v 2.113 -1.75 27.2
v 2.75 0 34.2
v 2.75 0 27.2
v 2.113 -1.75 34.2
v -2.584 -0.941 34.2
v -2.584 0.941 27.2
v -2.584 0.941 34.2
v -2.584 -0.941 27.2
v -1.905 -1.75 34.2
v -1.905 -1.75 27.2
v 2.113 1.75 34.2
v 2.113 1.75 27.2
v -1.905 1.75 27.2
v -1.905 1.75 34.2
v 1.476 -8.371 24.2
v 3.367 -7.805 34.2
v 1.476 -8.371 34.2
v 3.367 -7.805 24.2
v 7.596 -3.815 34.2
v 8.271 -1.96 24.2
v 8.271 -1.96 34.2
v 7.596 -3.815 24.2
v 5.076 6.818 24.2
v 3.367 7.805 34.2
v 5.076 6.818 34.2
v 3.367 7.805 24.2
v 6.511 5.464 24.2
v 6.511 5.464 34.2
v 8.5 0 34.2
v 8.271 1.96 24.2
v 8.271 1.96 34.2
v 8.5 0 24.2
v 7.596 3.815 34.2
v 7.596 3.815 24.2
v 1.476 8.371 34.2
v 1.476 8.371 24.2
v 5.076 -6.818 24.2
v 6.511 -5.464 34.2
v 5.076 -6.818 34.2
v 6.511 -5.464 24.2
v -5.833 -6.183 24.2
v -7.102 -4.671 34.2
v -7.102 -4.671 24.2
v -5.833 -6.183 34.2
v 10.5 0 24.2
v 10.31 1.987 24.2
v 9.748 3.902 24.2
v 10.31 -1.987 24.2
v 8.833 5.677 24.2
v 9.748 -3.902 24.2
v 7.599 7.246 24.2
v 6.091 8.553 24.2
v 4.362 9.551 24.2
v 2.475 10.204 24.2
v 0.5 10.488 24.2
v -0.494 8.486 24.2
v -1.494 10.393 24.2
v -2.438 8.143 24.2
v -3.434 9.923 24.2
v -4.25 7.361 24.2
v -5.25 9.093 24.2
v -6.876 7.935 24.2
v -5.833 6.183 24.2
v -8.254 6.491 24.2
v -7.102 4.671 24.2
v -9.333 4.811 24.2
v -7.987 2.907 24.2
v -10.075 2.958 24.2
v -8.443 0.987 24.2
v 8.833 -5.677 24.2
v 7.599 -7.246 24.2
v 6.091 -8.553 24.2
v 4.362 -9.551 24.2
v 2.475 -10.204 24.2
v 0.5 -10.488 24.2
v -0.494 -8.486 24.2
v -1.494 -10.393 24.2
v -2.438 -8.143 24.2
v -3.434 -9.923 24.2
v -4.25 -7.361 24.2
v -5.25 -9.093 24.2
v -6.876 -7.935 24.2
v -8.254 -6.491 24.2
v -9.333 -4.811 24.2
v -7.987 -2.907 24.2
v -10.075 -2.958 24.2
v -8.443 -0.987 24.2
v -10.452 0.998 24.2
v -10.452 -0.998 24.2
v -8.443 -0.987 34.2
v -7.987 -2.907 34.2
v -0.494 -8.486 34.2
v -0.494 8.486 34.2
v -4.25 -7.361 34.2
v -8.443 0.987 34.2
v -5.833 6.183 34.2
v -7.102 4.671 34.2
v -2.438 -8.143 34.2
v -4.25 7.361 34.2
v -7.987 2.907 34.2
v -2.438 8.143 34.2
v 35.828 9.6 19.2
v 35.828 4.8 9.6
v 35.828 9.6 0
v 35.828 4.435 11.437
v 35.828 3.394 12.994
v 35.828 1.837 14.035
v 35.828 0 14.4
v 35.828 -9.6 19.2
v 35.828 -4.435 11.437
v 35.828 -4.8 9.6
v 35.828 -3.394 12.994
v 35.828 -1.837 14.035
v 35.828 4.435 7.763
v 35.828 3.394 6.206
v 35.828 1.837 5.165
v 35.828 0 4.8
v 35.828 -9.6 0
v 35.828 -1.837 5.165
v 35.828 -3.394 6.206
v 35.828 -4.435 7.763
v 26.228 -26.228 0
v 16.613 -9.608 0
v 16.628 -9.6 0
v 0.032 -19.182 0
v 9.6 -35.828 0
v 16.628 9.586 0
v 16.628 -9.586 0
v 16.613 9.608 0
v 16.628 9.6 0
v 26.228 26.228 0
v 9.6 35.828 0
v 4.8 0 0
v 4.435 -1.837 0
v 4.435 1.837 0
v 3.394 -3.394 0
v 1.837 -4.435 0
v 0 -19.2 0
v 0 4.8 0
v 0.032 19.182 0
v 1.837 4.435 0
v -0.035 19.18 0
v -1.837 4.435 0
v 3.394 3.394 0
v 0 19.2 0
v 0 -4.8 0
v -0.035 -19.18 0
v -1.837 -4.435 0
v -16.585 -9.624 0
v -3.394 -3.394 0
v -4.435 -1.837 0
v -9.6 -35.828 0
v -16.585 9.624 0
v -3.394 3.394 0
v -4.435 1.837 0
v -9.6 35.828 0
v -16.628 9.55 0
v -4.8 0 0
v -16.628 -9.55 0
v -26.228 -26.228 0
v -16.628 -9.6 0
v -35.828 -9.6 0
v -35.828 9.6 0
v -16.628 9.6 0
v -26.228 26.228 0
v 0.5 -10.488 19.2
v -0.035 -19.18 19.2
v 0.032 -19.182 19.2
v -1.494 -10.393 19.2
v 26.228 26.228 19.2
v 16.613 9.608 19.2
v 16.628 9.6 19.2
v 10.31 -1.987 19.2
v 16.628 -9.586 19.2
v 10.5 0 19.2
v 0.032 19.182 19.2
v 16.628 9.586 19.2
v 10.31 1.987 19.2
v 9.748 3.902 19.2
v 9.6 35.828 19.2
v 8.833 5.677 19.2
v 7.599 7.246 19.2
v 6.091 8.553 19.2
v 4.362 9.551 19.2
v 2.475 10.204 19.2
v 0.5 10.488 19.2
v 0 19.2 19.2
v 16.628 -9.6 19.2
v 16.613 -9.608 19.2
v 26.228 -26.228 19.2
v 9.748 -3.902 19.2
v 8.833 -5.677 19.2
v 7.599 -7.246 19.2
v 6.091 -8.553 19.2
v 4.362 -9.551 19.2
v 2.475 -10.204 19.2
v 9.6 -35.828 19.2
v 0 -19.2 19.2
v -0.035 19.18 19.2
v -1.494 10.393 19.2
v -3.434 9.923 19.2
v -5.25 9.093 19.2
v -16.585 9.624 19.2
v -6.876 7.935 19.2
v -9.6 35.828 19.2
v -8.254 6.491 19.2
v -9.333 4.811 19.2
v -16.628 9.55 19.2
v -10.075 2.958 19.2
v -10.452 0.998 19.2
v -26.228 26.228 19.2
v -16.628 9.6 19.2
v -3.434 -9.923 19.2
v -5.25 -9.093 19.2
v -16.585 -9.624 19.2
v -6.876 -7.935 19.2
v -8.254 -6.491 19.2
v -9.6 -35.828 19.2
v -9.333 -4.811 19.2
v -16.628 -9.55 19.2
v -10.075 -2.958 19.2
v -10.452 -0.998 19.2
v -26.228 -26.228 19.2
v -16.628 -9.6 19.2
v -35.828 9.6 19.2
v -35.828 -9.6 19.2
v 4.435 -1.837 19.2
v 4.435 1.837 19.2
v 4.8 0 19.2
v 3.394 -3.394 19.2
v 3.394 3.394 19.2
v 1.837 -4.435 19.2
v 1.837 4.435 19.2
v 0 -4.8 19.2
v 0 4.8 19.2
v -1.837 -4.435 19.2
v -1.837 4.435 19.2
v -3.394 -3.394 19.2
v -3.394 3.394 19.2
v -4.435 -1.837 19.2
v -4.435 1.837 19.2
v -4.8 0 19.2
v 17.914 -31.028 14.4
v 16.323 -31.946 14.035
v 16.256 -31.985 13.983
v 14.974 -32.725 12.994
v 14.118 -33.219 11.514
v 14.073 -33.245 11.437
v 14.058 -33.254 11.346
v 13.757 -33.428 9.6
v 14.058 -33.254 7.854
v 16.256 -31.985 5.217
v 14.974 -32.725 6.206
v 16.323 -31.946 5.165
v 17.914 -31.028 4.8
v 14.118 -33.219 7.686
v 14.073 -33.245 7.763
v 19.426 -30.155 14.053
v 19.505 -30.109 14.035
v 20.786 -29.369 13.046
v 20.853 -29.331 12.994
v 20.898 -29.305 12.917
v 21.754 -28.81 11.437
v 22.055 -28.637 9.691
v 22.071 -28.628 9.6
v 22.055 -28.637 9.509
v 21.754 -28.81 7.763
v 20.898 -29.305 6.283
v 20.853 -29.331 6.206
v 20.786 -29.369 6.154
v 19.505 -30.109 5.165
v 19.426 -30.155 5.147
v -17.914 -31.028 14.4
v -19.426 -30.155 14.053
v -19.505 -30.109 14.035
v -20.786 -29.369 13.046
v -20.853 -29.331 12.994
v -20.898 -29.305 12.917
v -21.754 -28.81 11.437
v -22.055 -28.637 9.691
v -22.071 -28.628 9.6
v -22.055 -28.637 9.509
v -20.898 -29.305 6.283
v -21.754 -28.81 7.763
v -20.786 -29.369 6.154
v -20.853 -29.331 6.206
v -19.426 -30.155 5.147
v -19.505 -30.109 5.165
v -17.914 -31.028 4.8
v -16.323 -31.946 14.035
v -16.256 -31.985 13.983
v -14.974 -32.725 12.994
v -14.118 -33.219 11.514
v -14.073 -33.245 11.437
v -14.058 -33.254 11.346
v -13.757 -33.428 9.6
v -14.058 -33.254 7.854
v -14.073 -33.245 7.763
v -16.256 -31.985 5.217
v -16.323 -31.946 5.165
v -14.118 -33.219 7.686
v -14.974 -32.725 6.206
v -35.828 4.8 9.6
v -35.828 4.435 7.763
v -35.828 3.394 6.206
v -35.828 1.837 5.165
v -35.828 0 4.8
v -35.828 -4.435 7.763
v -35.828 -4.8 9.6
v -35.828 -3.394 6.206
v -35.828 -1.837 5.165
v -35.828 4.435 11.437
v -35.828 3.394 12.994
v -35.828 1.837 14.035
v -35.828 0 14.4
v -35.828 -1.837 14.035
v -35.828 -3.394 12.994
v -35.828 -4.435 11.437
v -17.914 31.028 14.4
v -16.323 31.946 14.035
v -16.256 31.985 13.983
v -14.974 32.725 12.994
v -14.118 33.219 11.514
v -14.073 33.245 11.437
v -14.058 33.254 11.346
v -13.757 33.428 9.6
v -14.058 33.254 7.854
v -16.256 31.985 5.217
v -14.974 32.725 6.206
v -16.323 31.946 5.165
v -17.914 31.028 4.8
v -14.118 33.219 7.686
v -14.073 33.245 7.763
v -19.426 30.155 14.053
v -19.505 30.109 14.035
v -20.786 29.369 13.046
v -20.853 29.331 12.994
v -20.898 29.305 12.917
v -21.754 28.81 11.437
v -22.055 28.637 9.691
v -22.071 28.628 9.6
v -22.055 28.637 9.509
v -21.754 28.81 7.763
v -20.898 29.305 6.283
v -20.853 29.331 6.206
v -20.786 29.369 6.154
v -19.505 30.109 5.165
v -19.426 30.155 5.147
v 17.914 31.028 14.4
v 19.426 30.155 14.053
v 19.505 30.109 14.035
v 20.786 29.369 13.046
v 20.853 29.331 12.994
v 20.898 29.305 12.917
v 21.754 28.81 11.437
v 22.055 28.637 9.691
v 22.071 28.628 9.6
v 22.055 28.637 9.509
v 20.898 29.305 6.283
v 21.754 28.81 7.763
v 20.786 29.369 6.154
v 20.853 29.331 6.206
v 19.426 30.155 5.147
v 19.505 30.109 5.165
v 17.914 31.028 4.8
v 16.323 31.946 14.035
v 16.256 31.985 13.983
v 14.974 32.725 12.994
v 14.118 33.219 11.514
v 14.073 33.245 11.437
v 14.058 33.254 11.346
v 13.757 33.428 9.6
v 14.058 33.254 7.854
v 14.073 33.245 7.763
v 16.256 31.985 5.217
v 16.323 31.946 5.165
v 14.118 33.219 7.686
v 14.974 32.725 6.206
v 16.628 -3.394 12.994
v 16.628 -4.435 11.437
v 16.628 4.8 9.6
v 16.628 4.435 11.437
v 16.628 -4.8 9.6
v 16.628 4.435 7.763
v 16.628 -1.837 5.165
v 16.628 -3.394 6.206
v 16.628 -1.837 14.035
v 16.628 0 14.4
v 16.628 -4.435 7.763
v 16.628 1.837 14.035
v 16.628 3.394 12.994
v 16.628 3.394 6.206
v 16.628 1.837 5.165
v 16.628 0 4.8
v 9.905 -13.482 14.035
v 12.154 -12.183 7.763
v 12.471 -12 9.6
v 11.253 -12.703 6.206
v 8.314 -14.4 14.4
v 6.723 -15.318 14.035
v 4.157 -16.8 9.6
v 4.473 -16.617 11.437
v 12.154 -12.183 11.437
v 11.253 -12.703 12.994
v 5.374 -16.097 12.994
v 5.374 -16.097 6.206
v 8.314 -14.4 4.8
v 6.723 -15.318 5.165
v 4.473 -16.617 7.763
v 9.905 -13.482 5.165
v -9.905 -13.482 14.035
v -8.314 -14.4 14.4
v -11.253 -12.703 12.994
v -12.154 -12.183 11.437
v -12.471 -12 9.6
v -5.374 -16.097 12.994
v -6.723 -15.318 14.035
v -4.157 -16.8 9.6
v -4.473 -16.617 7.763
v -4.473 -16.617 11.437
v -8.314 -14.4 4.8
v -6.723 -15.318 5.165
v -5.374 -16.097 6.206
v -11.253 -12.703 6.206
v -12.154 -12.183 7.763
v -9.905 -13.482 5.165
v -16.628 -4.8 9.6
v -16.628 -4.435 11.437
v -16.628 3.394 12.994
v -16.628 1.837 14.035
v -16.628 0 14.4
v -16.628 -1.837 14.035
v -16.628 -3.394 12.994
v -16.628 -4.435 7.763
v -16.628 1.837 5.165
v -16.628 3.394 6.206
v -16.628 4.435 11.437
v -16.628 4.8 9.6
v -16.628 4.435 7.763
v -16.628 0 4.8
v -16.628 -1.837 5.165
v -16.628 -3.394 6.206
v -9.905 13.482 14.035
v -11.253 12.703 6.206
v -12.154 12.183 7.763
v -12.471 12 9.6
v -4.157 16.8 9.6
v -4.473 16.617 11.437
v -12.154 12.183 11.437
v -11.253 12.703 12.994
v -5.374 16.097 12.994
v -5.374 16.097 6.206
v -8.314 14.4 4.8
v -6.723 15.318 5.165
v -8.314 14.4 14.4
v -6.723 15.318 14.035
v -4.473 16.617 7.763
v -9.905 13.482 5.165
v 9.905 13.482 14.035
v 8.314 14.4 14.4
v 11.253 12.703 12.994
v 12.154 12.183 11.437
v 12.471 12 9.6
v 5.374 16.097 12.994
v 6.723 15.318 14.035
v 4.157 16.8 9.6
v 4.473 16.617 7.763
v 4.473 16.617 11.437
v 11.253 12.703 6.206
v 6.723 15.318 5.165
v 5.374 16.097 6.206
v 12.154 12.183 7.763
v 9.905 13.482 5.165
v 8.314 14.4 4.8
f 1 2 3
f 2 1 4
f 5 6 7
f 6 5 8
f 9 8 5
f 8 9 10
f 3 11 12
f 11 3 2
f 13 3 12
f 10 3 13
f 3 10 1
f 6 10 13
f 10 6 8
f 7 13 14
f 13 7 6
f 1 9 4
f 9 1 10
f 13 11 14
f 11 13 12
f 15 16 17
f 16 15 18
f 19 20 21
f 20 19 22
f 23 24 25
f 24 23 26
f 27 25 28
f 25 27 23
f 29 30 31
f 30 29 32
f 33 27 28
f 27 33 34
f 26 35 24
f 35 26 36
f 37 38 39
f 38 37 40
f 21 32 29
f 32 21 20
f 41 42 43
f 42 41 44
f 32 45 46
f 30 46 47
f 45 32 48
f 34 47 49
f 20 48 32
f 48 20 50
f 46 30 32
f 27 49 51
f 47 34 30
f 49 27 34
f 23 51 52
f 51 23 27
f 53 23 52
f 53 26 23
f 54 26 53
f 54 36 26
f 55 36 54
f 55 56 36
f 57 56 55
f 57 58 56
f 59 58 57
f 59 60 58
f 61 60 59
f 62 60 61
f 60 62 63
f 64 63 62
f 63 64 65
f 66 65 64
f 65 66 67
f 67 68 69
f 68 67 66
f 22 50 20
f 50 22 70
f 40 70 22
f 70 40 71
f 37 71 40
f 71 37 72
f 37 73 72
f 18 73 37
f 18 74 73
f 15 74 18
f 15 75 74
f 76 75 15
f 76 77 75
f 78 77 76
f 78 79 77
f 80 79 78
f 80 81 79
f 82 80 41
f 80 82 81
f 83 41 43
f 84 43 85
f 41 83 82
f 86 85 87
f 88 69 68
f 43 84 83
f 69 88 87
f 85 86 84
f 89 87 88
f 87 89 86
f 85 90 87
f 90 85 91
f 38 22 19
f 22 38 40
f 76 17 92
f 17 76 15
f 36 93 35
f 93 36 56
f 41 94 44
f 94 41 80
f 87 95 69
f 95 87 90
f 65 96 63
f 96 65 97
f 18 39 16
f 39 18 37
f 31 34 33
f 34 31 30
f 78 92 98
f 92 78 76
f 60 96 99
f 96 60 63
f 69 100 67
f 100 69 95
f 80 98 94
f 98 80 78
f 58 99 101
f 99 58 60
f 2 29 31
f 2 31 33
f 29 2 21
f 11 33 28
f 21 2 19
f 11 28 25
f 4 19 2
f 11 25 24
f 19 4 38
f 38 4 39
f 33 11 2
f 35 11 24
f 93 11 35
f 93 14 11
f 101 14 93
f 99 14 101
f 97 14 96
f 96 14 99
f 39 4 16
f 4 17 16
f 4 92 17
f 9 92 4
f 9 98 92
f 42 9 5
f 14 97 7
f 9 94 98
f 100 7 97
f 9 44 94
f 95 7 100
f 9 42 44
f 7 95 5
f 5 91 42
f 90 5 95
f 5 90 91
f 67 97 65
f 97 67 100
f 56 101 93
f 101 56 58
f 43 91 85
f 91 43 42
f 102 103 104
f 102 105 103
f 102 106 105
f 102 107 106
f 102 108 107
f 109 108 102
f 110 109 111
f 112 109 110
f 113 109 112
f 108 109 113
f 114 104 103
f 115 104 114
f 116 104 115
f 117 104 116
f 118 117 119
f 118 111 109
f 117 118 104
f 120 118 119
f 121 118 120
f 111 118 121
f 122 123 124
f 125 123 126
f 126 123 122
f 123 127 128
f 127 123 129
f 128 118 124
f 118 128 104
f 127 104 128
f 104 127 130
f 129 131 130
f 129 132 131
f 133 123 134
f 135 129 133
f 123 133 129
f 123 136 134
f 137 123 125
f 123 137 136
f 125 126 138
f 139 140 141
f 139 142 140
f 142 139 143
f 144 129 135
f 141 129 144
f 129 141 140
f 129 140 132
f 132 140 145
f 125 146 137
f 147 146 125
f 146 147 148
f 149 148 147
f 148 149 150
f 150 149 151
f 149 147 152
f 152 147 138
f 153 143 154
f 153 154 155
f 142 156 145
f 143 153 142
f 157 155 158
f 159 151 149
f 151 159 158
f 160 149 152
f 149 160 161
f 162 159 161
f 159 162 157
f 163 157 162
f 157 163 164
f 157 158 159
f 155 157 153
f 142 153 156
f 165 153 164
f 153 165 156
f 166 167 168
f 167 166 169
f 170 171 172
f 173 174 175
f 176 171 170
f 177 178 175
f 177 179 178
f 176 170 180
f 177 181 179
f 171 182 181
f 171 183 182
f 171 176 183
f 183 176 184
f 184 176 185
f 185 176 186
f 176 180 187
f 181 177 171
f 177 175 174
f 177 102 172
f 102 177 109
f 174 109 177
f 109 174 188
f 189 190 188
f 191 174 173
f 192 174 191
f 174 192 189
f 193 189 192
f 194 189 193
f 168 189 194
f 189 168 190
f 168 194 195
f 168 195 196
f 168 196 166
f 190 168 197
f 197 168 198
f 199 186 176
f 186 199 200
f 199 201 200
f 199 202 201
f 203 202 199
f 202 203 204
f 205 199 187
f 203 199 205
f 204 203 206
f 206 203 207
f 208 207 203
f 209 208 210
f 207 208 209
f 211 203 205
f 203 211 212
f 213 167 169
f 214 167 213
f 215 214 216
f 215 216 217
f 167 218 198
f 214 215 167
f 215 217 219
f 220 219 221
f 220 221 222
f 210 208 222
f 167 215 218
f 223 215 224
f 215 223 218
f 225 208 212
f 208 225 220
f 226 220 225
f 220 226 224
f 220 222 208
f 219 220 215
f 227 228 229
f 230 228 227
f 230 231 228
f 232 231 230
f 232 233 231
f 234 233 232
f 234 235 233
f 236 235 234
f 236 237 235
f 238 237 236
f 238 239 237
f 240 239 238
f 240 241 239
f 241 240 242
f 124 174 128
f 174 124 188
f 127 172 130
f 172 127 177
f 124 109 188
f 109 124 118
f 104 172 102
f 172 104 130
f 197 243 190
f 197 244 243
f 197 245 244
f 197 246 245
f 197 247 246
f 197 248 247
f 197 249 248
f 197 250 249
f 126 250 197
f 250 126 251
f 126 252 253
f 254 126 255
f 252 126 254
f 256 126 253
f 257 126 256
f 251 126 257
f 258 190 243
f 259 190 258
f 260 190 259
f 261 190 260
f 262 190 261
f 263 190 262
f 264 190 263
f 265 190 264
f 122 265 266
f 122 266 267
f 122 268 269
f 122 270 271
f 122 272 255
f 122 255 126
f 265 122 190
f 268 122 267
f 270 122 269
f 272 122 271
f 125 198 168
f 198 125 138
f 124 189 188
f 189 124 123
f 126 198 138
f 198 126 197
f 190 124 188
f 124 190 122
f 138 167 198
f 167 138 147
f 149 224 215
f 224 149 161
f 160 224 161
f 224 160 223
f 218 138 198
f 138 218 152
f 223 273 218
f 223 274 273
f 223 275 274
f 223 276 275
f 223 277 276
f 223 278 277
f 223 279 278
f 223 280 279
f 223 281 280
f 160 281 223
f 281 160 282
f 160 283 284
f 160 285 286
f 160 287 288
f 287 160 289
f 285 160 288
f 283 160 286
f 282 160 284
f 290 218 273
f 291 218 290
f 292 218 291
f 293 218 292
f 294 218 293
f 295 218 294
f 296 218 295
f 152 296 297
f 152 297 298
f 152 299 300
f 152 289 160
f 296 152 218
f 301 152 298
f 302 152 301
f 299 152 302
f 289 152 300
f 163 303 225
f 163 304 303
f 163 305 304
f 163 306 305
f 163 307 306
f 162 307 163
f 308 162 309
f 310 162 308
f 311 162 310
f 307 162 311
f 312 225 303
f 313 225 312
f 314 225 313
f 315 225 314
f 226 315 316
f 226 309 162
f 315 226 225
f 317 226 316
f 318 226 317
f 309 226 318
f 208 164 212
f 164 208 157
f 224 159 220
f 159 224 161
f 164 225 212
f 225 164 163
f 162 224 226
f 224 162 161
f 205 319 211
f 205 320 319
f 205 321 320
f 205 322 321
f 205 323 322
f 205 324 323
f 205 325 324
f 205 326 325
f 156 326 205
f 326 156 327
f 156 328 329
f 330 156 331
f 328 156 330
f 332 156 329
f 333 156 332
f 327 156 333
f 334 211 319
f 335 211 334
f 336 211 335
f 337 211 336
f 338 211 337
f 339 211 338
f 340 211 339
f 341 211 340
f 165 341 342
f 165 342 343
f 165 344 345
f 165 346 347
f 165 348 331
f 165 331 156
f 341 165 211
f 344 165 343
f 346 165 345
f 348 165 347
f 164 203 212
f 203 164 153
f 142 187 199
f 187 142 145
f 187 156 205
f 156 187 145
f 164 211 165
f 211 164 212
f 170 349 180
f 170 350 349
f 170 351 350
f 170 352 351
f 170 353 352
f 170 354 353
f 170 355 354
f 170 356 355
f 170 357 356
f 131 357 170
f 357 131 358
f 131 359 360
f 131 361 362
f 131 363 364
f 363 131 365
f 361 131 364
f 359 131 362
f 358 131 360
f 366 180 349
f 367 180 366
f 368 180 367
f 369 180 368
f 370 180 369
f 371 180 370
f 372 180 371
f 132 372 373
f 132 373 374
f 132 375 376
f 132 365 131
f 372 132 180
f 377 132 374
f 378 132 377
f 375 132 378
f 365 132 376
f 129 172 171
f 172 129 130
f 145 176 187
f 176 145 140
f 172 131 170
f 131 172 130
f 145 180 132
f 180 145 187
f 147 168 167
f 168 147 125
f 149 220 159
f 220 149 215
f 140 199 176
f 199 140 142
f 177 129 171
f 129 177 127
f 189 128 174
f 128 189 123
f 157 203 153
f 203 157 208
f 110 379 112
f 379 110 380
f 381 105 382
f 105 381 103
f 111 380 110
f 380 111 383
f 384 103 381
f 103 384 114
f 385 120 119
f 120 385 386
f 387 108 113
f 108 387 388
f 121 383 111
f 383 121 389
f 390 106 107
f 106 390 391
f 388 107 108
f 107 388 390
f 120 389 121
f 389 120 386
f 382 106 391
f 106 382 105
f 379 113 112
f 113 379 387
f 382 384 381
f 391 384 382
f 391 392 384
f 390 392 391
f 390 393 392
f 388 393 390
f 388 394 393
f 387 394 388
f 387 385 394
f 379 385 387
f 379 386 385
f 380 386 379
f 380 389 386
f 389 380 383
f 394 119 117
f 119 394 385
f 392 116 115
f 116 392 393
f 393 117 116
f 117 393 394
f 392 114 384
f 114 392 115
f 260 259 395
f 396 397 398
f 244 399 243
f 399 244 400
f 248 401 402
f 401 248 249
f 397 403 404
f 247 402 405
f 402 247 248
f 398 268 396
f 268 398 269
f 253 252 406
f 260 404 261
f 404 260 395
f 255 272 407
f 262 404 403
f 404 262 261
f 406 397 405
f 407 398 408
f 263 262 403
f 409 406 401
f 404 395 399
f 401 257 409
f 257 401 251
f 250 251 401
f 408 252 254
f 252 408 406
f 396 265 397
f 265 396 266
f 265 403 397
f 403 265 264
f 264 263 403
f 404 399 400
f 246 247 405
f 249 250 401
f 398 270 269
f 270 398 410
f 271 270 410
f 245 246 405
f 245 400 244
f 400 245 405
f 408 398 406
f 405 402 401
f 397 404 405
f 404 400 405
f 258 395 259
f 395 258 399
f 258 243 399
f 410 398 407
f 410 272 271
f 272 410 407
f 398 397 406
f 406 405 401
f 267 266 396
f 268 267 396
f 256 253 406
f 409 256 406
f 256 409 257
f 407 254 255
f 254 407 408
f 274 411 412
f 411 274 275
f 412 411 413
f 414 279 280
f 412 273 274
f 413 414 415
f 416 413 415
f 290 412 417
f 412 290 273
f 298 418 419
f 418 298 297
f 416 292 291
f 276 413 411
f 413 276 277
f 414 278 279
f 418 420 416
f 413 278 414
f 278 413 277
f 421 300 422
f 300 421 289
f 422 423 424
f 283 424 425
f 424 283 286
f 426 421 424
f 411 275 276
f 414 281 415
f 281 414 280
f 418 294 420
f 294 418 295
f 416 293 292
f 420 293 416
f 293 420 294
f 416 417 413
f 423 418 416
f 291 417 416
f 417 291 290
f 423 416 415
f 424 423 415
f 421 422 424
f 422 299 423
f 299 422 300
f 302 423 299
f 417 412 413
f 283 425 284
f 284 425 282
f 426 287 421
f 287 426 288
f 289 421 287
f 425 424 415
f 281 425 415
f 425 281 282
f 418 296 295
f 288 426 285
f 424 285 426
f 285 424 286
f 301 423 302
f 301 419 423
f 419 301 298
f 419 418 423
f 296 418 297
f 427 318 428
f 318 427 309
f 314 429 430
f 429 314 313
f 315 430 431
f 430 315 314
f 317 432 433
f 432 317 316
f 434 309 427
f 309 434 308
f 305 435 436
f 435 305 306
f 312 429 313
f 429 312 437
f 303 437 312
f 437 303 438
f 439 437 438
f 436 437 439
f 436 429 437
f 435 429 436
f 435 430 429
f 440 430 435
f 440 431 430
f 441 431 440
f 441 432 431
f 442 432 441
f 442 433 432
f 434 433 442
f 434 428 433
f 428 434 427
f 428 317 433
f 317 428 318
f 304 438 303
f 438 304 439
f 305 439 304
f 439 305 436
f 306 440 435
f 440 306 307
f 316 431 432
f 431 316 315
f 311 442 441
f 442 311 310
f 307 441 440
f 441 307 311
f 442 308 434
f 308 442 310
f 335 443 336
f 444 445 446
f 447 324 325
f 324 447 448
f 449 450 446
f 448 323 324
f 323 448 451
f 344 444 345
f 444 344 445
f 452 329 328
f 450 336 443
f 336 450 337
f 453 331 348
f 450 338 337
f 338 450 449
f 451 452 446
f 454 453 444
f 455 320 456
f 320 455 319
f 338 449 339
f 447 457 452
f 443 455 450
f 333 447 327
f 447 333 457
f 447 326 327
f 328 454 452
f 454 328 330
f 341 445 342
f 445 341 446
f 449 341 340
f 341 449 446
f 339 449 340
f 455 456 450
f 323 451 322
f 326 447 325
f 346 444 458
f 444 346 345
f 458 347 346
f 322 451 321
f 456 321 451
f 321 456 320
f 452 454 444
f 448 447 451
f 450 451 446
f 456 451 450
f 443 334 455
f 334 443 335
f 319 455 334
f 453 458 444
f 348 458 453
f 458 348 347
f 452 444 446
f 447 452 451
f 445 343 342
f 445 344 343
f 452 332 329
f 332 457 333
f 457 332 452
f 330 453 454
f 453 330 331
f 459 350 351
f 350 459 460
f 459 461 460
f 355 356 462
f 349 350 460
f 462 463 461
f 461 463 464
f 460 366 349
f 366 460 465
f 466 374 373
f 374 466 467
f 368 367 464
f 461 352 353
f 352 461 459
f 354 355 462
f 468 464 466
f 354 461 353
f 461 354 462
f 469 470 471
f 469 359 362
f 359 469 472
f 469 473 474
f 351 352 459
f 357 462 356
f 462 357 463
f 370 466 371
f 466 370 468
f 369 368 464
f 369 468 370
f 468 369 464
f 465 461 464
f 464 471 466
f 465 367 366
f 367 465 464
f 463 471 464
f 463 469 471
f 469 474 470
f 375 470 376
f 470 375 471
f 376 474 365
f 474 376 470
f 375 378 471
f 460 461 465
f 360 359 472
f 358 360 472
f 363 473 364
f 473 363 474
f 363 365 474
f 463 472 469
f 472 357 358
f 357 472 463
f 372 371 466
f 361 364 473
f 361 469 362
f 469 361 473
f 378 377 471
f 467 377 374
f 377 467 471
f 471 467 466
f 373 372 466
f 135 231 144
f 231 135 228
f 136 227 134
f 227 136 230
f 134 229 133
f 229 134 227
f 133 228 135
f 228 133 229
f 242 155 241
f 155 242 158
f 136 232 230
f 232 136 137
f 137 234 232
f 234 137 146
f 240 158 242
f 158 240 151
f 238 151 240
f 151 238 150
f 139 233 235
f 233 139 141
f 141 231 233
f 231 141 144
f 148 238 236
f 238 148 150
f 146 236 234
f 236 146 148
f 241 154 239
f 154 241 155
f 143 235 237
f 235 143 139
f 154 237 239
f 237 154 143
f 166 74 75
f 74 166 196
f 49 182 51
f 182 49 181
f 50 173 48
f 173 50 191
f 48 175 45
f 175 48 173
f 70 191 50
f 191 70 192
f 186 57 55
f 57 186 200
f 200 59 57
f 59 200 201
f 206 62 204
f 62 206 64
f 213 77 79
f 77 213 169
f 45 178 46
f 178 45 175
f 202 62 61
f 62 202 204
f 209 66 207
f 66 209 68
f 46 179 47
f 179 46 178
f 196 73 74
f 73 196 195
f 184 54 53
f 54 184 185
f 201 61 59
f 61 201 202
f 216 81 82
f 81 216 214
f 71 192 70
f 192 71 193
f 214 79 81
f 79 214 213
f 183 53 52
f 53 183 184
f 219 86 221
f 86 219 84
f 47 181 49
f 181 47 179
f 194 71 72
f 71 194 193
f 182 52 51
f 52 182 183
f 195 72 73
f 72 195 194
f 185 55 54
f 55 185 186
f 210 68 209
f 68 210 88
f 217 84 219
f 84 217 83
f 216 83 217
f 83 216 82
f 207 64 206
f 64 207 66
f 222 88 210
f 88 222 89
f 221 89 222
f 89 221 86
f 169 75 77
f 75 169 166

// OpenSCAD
// file: wedge.scad
//Title: Wedge Module
//Author: Alex English - ProtoParadigm
//Date: 1/4/2013
//License: Creative Commons - Share Alike - Attribution

//Usage: Include in your other .scad projects and call wedge with arguments for the height of the wedge, the radius of the wedge, and the angle of the wedge in degrees.  The resulting wedge will be placed with the point at the origin, extending into the z axis, with the angle starting at the x axis and extending counter-clockwise as per the right-hand rule.

//Updated: 1/12/2013 - Increased dimensions of wedge to be revoved when angle is more than 180 as per suggestion from kitwallace.

module wedge_180(h, r, d)
{
	rotate(d) difference()
	{
		rotate(180-d) difference()
		{
			cylinder(h = h, r = r);
			translate([-(r+1), 0, -1]) cube([r*2+2, r+1, h+2]);
		}
		translate([-(r+1), 0, -1]) cube([r*2+2, r+1, h+2]);
	}
}

module wedge(h, r, d)
{
	if(d <= 180)
		wedge_180(h, r, d);
	else
		rotate(d) difference()
		{
			cylinder(h = h, r = r);
			translate([0, 0, -1]) wedge_180(h+2, r+1, 360-d);
		}
}

//Example: wedge(10, 20, 145); //would create a wedge 10 high, with a radius of 20, and an angle of 33 degrees.
// main file
include <wedge.scad>;

// Minimum angle for fragmenting curves
$fa = 1;

PI = 3.1415927;

////////////////////////////////////////////////////////////////////////////////
// Size Definitions
////////////////////////////////////////////////////////////////////////////////

// Size of the dowel rods used in construction
DOWEL_DIAMETER = 9;
DOWEL_RADIUS   = DOWEL_DIAMETER/2;

// Sizes of holes for dowel rods in various situations
DOWEL_PRINTED_SOCKET_RADIUS= DOWEL_RADIUS + 0.3;
DOWEL_CUT_HOLE_RADIUS= DOWEL_RADIUS * 3;

// Thickness of a block into which a dowel rod inserted should be
DOWEL_PRINTED_SOCKET_BLOCK = DOWEL_PRINTED_SOCKET_RADIUS * 3;
// Depth of a socket to accept the dowel rod
DOWEL_PRINTED_SOCKET_DEPTH = DOWEL_PRINTED_SOCKET_RADIUS * 2.5;

// As above but for load-bearing joints
DOWEL_PRINTED_SOCKET_BLOCK_LOADED = DOWEL_PRINTED_SOCKET_RADIUS * 4;
DOWEL_PRINTED_SOCKET_DEPTH_LOADED = DOWEL_PRINTED_SOCKET_RADIUS * 4;

// Maximum 3D printable size
MAX_3D_PRINT_DIMENSION = 90;

// Size of the glow-in-the-dark cylinder
DISPLAY_HEIGHT       = 609.6; // 24in
DISPLAY_CIRCUMFRENCE = 1000;  // 1m
DISPLAY_RADIUS       = (DISPLAY_CIRCUMFRENCE / PI) / 2;
DISPLAY_THICKNESS    = 1;

// The cardboard rings which live inside the display to hold its shape
DISPLAY_SHAPE_RING_THICKNESS = 3;  // Cardboard Thickness
DISPLAY_SHAPE_RINGS_START    = 50; // The offset from the bottom of the cylinder of the first ring.
DISPLAY_SHAPE_RINGS_END      = 50; // The offset from the top of the cylinder of the last ring.
DISPLAY_SHAPE_RINGS_NUM      = 4;  // Number of shaping rings

// Size of the ledge on each of the spokes which the display will rest.
DISPLAY_GRIP_LEDGE = 5;
// Thickness of the ledge on which the display sits
DISPLAY_GRIP_THICKNESS = 5;

// Bearing dimensions
BEARING_INNER_RADIUS = 18/2; // Inner radius
BEARING_OUTER_RADIUS = 34/2; // Outer radius
BEARING_THICKNESS    = 10;   // Ring thickness
BEARING_INNER_LIP    = 2;    // Size of the edge of the inner ring
BEARING_OUTER_LIP    = 5;    // Size of the fixed outer ring
BEARING_PRINT_SLACK  = 0.5;  // Amount of slack to add to the radius for 3D printed fittings

// Motor shaft dimensions
MOTOR_SHAFT_RADIUS    = (5+0.5)/2;
MOTOR_SHAFT_KEY_WIDTH = 3+0.5;
MOTOR_SHAFT_LENGTH    = 6+1;

// Number of spokes/grips used to support the display
DISPLAY_BASE_SPOKES = 6;
// Number of spokes at the top of the display
DISPLAY_TOP_SPOKES = 3;

// Seperation between the two rods which run down the side of the system
// attached to the electronics.
DOUBLE_SHAFT_SEP = 33; // Approximately the width of circuit board (1.4")


////////////////////////////////////////////////////////////////////////////////
// Colour Palette
////////////////////////////////////////////////////////////////////////////////

COLOUR_CARDBOARD    = [184/255,165/255,103/255];
COLOUR_GLOW_IN_DARK = [198/255,245/255,188/255];
COLOUR_3D_PRINTED   = [0.2,0.2,0.2];


////////////////////////////////////////////////////////////////////////////////
// Components
////////////////////////////////////////////////////////////////////////////////

// The display cylinder and axel
module display() {
	// The display surface itself
	color(COLOUR_GLOW_IN_DARK)
		difference() {
			cylinder(h = DISPLAY_HEIGHT, r=DISPLAY_RADIUS);
			translate([0,0,-0.5])
			cylinder(h = DISPLAY_HEIGHT+1, r=DISPLAY_RADIUS - DISPLAY_THICKNESS);
		}
	
	// The cardboard support rings 
	color(COLOUR_CARDBOARD)
		for (i = [0 : DISPLAY_SHAPE_RINGS_NUM-1]) {
			translate([0,0,DISPLAY_SHAPE_RINGS_START
			                 + i * (( DISPLAY_HEIGHT
			                          - DISPLAY_SHAPE_RINGS_START
			                          - DISPLAY_SHAPE_RINGS_END
			                        ) / (DISPLAY_SHAPE_RINGS_NUM-1))
			          ])
				difference() {
					// The ring
					cylinder( h = DISPLAY_SHAPE_RING_THICKNESS
					        , r = DISPLAY_RADIUS - DISPLAY_THICKNESS
					        );
					// Space for the axel
					translate([0,0,-0.5])
					cylinder( h = DISPLAY_SHAPE_RING_THICKNESS+1
					        , r = DOWEL_CUT_HOLE_RADIUS
					        );
				}
		}
}


// A part which sits on the end of a spoke and grips the display
module display_grip( angle
                   , DOWEL_PRINTED_SOCKET_BLOCK = DOWEL_PRINTED_SOCKET_BLOCK
                   , DOWEL_PRINTED_SOCKET_DEPTH = DOWEL_PRINTED_SOCKET_DEPTH
                   ) {
	// A wedge the width of the ledge which should be as big as can be 3D
	// printed (cosine rule)
	wedge_angle = acos( (2*pow(DISPLAY_RADIUS+DISPLAY_GRIP_LEDGE,2) - pow(MAX_3D_PRINT_DIMENSION,2))
	                    / (2*pow(DISPLAY_RADIUS+DISPLAY_GRIP_LEDGE,2))
	                  );
	
	color(COLOUR_3D_PRINTED)
	rotate([0,0, angle]) {
		difference() {
			// The wedge with a lip
			intersection() {
				// The profile of the ledge
				union() {
					// The spoke accepting part
					cylinder( h = DOWEL_PRINTED_SOCKET_BLOCK
					        , r = DISPLAY_RADIUS - DISPLAY_THICKNESS
					        );
					// The ledge
					cylinder( h = DISPLAY_GRIP_THICKNESS
					        , r = DISPLAY_RADIUS + DISPLAY_GRIP_LEDGE
					        );
				}
				rotate([0,0, -wedge_angle/2])
					wedge( h = DOWEL_PRINTED_SOCKET_BLOCK
					     , r = DISPLAY_RADIUS + DISPLAY_GRIP_LEDGE
					     , d = wedge_angle
					     );
			}
			
			// The excess wedge excluding space for the axel
			difference() {
				translate([0,0,-0.5])
				cylinder( h = DOWEL_PRINTED_SOCKET_BLOCK + 1
				        , r = DISPLAY_RADIUS - DISPLAY_THICKNESS - DISPLAY_GRIP_THICKNESS
				        );
				translate([0, -DOWEL_PRINTED_SOCKET_BLOCK/2, 0])
					cube([ DISPLAY_RADIUS - DISPLAY_THICKNESS
					     , DOWEL_PRINTED_SOCKET_BLOCK
					     , DOWEL_PRINTED_SOCKET_BLOCK
					     ]);
			}
			
			// The excess axel socket 
			translate([0,0,-0.5])
			cylinder( h = DOWEL_PRINTED_SOCKET_BLOCK + 1
			        , r = DISPLAY_RADIUS
			              - DISPLAY_THICKNESS
			              - DISPLAY_GRIP_THICKNESS
			              - DOWEL_PRINTED_SOCKET_DEPTH
			        );
			
			// Drill out the hole for the dowel
			translate([0, 0, DOWEL_PRINTED_SOCKET_BLOCK/2])
				rotate([0, 90, 0])
					cylinder( h = DISPLAY_RADIUS - DISPLAY_THICKNESS - DISPLAY_GRIP_THICKNESS
					        , r = DOWEL_PRINTED_SOCKET_RADIUS
					        );
		}
	}
}


// An axel with an arbitary number of spokes, a shaft and an inner-bearing
// fitting with motor key.
//
// The center of the spoke holes are at BEARING_THICKNESS +
// DISPLAY_GRIP_THICKNESS +
// DOWEL_PRINTED_SOCKET_BLOCK/2.
module axel( num_spokes
           , keyed = false
           , DOWEL_PRINTED_SOCKET_BLOCK = DOWEL_PRINTED_SOCKET_BLOCK
           , DOWEL_PRINTED_SOCKET_DEPTH = DOWEL_PRINTED_SOCKET_DEPTH) {
	// Work out the minimum radius of the inside of the axel which will fit the
	// specified number of spokes. (Cosine rule rearranged)
	min_inner_radius = sqrt(pow(DOWEL_PRINTED_SOCKET_BLOCK,2) / (2*(1 - cos(360/num_spokes))));
	
	inner_radius = max(min_inner_radius, BEARING_INNER_RADIUS + DISPLAY_GRIP_THICKNESS - BEARING_PRINT_SLACK);
	
	// Position of the end of rods within the axel
	rod_inner_radius = inner_radius * cos((360/num_spokes)/2);
	
	color(COLOUR_3D_PRINTED) {
		// Bearing lip contact
		translate([0,0,BEARING_THICKNESS])
			cylinder( r = BEARING_INNER_RADIUS + BEARING_INNER_LIP - BEARING_PRINT_SLACK
			        , h = DISPLAY_GRIP_THICKNESS
			        );
		
		// Bearing fitting with motor keying
		difference() {
			// Bearing fitting
			cylinder( r = BEARING_INNER_RADIUS - BEARING_PRINT_SLACK
			        , h = BEARING_THICKNESS
			        );
			
			// Keying
			if (keyed) {
				translate([0,0,-1])
				intersection() {
					cylinder( r = MOTOR_SHAFT_RADIUS
					        , h = MOTOR_SHAFT_LENGTH+1
					        );
					cube( [ MOTOR_SHAFT_RADIUS*2
					      , MOTOR_SHAFT_KEY_WIDTH
					      , 2*(MOTOR_SHAFT_LENGTH+2)
					      ]
					    , center=true
					    );
				}
			}
		}
		
		// Axel body
		translate([0,0,BEARING_THICKNESS + DISPLAY_GRIP_THICKNESS])
		difference() {
			union() {
				// Central cylinder
				cylinder( r = inner_radius
				        , h = DOWEL_PRINTED_SOCKET_BLOCK
				        );
				// Blocks for the spokes
				for (i = [0:num_spokes-1]) {
					rotate([0,0,i*(360/num_spokes)])
						translate([rod_inner_radius,-DOWEL_PRINTED_SOCKET_BLOCK/2,0])
							cube([ DOWEL_PRINTED_SOCKET_DEPTH
							     , DOWEL_PRINTED_SOCKET_BLOCK
							     , DOWEL_PRINTED_SOCKET_BLOCK
							     ]);
				}
			}
			
			// Drill out the holes for the spokes
			for (i = [0:num_spokes-1]) {
				rotate([0, 0, i*(360/num_spokes)])
					translate([rod_inner_radius, 0, DOWEL_PRINTED_SOCKET_BLOCK/2])
						rotate([0, 90, 0])
							cylinder( h = DOWEL_PRINTED_SOCKET_DEPTH+1
							        , r = DOWEL_PRINTED_SOCKET_RADIUS
							        );
			}
			
			// Drill out the hole for the shaft
			translate([0,0,DOWEL_PRINTED_SOCKET_BLOCK-DOWEL_PRINTED_SOCKET_DEPTH])
			cylinder( h = DOWEL_PRINTED_SOCKET_DEPTH+1
			        , r = DOWEL_PRINTED_SOCKET_RADIUS
			        );
		}
	}
}

// Display with grips and axels.
module display_assembly() {
	// Bottom Axel with shaft
	axel( DISPLAY_BASE_SPOKES
	    , keyed = true
	    , DOWEL_PRINTED_SOCKET_BLOCK = DOWEL_PRINTED_SOCKET_BLOCK_LOADED
	    , DOWEL_PRINTED_SOCKET_DEPTH = DOWEL_PRINTED_SOCKET_DEPTH_LOADED
	    );
	
	translate([0,0,BEARING_THICKNESS + DISPLAY_GRIP_THICKNESS]) { 
		// Cylinder Itself
		translate([0,0,DISPLAY_GRIP_THICKNESS])
			%display();
		
		// Base Support
		for (i = [0:DISPLAY_BASE_SPOKES-1])
			display_grip( i*(360/DISPLAY_BASE_SPOKES)
			            , DOWEL_PRINTED_SOCKET_BLOCK = DOWEL_PRINTED_SOCKET_BLOCK_LOADED
			            , DOWEL_PRINTED_SOCKET_DEPTH = DOWEL_PRINTED_SOCKET_DEPTH_LOADED
			            );
		
		// Top Support
		translate([0,0, DISPLAY_HEIGHT + 2*DISPLAY_GRIP_THICKNESS]) {
			// Supports
			for (i = [0:DISPLAY_TOP_SPOKES])
				rotate([180,0,0])
					display_grip(i*(360/DISPLAY_TOP_SPOKES));
			// Axel at the top
			translate([0,0,BEARING_THICKNESS + DISPLAY_GRIP_THICKNESS])
				rotate([180,0,0])
					axel(DISPLAY_TOP_SPOKES);
		}
	}
}



// An axel-like item which supports the outside of the top bearing and connects
// to the outer frame.
module top_bearing_grip(num_spokes = 3) {
	// Work out the minimum radius of the inside of the axel which will fit the
	// specified number of spokes. (Cosine rule rearranged)
	min_inner_radius = sqrt(pow(DOWEL_PRINTED_SOCKET_BLOCK,2) / (2*(1 - cos(360/num_spokes))));
	
	inner_radius = max(min_inner_radius, BEARING_OUTER_RADIUS + DISPLAY_GRIP_THICKNESS + BEARING_PRINT_SLACK);
	
	// Position of the end of rods within the axel
	rod_inner_radius = inner_radius * cos((360/num_spokes)/2);
	
	color(COLOUR_3D_PRINTED) {
		// The axel
		translate([0,0,BEARING_THICKNESS + DISPLAY_GRIP_THICKNESS])
		difference() {
			union() {
				// Central cylinder
				cylinder( r = inner_radius
				        , h = DOWEL_PRINTED_SOCKET_BLOCK
				        );
				// Blocks for the spokes
				for (i = [0:num_spokes-1]) {
					rotate([0,0,i*(360/num_spokes)])
						translate([rod_inner_radius,-DOWEL_PRINTED_SOCKET_BLOCK/2,0])
							cube([ DOWEL_PRINTED_SOCKET_DEPTH
							     , DOWEL_PRINTED_SOCKET_BLOCK
							     , DOWEL_PRINTED_SOCKET_BLOCK
							     ]);
				}
			}
			
			// Drill out the holes for the spokes
			for (i = [0:num_spokes-1]) {
				rotate([0, 0, i*(360/num_spokes)])
					translate([rod_inner_radius, 0, DOWEL_PRINTED_SOCKET_BLOCK/2])
						rotate([0, 90, 0])
							cylinder( h = DOWEL_PRINTED_SOCKET_DEPTH+1
							        , r = DOWEL_PRINTED_SOCKET_RADIUS
							        );
			}
		}
		
		// The grip for the bearing
		difference() {
			// Outer cylinder
			cylinder( r = inner_radius
			        , h = BEARING_THICKNESS + DISPLAY_GRIP_THICKNESS
			        );
			
			// Drill out the bearing grip
			translate([0,0,-1])
			cylinder( r = BEARING_OUTER_RADIUS + BEARING_PRINT_SLACK
			        , h = BEARING_THICKNESS+1
			        );
			
			// Drill out the lip
			translate([0,0,-1])
			cylinder( r = BEARING_OUTER_RADIUS - BEARING_OUTER_LIP + BEARING_PRINT_SLACK
			        , h = BEARING_THICKNESS+DISPLAY_GRIP_THICKNESS+1
			        );
		}
	}
}


// An N-dowel bracket
module bracket(angles = [-180/6, 0, 180/6]) {
	// XXX: Because I can't compute this in OSCAD...
	min_angle = angles[1] - angles[0];
	
	// Work out the minimum radius of the inside of the bracket from which the
	// rods should radiate.
	min_inner_radius = sqrt(pow(2.5*DOWEL_PRINTED_SOCKET_RADIUS,2) / (2*(1 - cos(min_angle))));
	
	color(COLOUR_3D_PRINTED) {
		// The joint between the two angles
		cylinder(r = DOWEL_PRINTED_SOCKET_BLOCK/2, h = DOWEL_PRINTED_SOCKET_BLOCK);
		
		difference() {
			// Blocks
			for (a = angles) {
				rotate([0,0,a]) {
					translate([0, -DOWEL_PRINTED_SOCKET_BLOCK/2, 0])
						cube([ min_inner_radius + DOWEL_PRINTED_SOCKET_DEPTH
						     , DOWEL_PRINTED_SOCKET_BLOCK
						     , DOWEL_PRINTED_SOCKET_BLOCK
						     ]);
				}
			}
			
			// Holes
			for (a = angles) {
				rotate([0,0,a]) {
					translate([min_inner_radius, 0, DOWEL_PRINTED_SOCKET_BLOCK/2])
						rotate([0,90,0])
							cylinder(r = DOWEL_PRINTED_SOCKET_RADIUS, h = DOWEL_PRINTED_SOCKET_DEPTH+1);
				}
			}
		}
	}
}


// A 3-spoked bracket which also terminates a long vertial shaft
module terminal_bracket() {
	color(COLOUR_3D_PRINTED)
	difference() {
		bracket();
		
		translate([0,0,DOWEL_PRINTED_SOCKET_BLOCK-DOWEL_PRINTED_SOCKET_DEPTH])
		cylinder( r = DOWEL_PRINTED_SOCKET_RADIUS
		        , h = DOWEL_PRINTED_SOCKET_DEPTH+1
		        );
	}
}


// A 3-spoked bracket which also terminates a long double vertial shaft
module double_terminal_bracket() {
	color(COLOUR_3D_PRINTED)
	difference() {
		union() {
			bracket();
			
			// Extension wings
			hull() {
				for (offset = [-DOUBLE_SHAFT_SEP/2,DOUBLE_SHAFT_SEP/2]) {
					translate([0,offset,0])
					cylinder( r = DOWEL_PRINTED_SOCKET_BLOCK/2
					        , h = DOWEL_PRINTED_SOCKET_BLOCK
					        );
				}
			}
		}
		
		// Drill out Shafts
		for (offset = [-DOUBLE_SHAFT_SEP/2,DOUBLE_SHAFT_SEP/2]) {
			translate([0,offset,DOWEL_PRINTED_SOCKET_BLOCK-DOWEL_PRINTED_SOCKET_DEPTH])
			cylinder( r = DOWEL_PRINTED_SOCKET_RADIUS
			        , h = DOWEL_PRINTED_SOCKET_DEPTH+1
			        );
		}
	}
}



////////////////////////////////////////////////////////////////////////////////
// Printable Parts (for STL Export)
////////////////////////////////////////////////////////////////////////////////

// Top Axel
module print_top_axel() {
	translate([0,0,(BEARING_THICKNESS + DISPLAY_GRIP_THICKNESS + DOWEL_PRINTED_SOCKET_BLOCK)])
	rotate([180,0,0])
	axel(DISPLAY_TOP_SPOKES, keyed = false);
}

// Bottom Axel
module print_base_axel() {
	translate([0,0,(BEARING_THICKNESS + DISPLAY_GRIP_THICKNESS + DOWEL_PRINTED_SOCKET_BLOCK_LOADED)])
	rotate([180,0,0])
	axel( DISPLAY_BASE_SPOKES
	    , keyed = true
	    , DOWEL_PRINTED_SOCKET_BLOCK = DOWEL_PRINTED_SOCKET_BLOCK_LOADED
	    , DOWEL_PRINTED_SOCKET_DEPTH = DOWEL_PRINTED_SOCKET_DEPTH_LOADED
	    );
}


////////////////////////////////////////////////////////////////////////////////
// What's displayed
////////////////////////////////////////////////////////////////////////////////

//display_assembly();

//translate([0,0,-(BEARING_THICKNESS + DISPLAY_GRIP_THICKNESS)])
//rotate([0,0,60])
//top_bearing_grip(3);
//for (a = [0:2]) {
//	rotate([0,0,a*(360/3)])
//		translate([-100,0,0])
//			if (a == 0)
//				double_terminal_bracket();
//			else
//				terminal_bracket();
//}
//

print_base_axel();
